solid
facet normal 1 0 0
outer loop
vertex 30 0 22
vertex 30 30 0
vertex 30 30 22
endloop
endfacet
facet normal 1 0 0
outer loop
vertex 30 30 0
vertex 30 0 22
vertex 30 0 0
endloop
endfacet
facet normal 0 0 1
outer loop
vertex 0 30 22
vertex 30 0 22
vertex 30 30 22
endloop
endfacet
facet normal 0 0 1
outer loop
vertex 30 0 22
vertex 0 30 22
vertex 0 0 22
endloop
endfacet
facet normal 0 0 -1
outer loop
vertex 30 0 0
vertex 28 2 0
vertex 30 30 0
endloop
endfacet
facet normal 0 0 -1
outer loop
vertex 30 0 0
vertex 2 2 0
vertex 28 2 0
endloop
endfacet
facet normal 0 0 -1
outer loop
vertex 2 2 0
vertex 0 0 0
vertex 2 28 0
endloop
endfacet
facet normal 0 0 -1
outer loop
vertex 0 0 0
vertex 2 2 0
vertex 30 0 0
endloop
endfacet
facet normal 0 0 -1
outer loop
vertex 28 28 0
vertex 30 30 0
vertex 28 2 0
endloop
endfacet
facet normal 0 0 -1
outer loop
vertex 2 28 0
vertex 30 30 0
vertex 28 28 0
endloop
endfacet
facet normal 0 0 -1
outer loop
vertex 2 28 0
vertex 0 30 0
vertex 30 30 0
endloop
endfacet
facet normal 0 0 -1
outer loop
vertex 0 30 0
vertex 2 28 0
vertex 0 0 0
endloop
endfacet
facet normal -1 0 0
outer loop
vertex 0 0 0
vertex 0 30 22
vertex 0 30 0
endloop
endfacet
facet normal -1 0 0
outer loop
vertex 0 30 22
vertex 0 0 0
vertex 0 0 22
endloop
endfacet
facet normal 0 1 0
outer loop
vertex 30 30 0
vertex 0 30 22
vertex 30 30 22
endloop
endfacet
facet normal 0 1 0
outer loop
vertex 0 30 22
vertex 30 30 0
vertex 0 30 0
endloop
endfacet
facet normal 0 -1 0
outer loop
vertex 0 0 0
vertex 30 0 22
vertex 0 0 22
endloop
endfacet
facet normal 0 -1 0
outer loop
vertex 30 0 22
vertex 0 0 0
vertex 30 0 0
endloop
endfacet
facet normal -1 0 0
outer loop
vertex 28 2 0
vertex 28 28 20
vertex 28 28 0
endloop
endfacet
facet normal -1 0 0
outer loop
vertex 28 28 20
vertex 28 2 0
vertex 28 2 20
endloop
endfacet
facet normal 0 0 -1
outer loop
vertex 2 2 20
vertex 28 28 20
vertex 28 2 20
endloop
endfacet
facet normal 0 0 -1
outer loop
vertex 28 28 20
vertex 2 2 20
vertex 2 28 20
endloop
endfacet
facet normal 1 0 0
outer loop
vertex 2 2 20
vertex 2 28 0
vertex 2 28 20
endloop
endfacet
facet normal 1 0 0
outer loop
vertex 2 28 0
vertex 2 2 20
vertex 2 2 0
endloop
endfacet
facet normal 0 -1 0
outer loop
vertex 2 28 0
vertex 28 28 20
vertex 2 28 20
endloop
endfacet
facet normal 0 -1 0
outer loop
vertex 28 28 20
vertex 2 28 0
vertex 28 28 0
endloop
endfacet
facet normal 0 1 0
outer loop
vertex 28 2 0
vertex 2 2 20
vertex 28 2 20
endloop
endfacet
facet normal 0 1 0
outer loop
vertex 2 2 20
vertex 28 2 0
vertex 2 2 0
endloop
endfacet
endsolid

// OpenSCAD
difference(){
cube([30,30,22]);
    translate([2,2,0])
cube([26,26,20]);
}
